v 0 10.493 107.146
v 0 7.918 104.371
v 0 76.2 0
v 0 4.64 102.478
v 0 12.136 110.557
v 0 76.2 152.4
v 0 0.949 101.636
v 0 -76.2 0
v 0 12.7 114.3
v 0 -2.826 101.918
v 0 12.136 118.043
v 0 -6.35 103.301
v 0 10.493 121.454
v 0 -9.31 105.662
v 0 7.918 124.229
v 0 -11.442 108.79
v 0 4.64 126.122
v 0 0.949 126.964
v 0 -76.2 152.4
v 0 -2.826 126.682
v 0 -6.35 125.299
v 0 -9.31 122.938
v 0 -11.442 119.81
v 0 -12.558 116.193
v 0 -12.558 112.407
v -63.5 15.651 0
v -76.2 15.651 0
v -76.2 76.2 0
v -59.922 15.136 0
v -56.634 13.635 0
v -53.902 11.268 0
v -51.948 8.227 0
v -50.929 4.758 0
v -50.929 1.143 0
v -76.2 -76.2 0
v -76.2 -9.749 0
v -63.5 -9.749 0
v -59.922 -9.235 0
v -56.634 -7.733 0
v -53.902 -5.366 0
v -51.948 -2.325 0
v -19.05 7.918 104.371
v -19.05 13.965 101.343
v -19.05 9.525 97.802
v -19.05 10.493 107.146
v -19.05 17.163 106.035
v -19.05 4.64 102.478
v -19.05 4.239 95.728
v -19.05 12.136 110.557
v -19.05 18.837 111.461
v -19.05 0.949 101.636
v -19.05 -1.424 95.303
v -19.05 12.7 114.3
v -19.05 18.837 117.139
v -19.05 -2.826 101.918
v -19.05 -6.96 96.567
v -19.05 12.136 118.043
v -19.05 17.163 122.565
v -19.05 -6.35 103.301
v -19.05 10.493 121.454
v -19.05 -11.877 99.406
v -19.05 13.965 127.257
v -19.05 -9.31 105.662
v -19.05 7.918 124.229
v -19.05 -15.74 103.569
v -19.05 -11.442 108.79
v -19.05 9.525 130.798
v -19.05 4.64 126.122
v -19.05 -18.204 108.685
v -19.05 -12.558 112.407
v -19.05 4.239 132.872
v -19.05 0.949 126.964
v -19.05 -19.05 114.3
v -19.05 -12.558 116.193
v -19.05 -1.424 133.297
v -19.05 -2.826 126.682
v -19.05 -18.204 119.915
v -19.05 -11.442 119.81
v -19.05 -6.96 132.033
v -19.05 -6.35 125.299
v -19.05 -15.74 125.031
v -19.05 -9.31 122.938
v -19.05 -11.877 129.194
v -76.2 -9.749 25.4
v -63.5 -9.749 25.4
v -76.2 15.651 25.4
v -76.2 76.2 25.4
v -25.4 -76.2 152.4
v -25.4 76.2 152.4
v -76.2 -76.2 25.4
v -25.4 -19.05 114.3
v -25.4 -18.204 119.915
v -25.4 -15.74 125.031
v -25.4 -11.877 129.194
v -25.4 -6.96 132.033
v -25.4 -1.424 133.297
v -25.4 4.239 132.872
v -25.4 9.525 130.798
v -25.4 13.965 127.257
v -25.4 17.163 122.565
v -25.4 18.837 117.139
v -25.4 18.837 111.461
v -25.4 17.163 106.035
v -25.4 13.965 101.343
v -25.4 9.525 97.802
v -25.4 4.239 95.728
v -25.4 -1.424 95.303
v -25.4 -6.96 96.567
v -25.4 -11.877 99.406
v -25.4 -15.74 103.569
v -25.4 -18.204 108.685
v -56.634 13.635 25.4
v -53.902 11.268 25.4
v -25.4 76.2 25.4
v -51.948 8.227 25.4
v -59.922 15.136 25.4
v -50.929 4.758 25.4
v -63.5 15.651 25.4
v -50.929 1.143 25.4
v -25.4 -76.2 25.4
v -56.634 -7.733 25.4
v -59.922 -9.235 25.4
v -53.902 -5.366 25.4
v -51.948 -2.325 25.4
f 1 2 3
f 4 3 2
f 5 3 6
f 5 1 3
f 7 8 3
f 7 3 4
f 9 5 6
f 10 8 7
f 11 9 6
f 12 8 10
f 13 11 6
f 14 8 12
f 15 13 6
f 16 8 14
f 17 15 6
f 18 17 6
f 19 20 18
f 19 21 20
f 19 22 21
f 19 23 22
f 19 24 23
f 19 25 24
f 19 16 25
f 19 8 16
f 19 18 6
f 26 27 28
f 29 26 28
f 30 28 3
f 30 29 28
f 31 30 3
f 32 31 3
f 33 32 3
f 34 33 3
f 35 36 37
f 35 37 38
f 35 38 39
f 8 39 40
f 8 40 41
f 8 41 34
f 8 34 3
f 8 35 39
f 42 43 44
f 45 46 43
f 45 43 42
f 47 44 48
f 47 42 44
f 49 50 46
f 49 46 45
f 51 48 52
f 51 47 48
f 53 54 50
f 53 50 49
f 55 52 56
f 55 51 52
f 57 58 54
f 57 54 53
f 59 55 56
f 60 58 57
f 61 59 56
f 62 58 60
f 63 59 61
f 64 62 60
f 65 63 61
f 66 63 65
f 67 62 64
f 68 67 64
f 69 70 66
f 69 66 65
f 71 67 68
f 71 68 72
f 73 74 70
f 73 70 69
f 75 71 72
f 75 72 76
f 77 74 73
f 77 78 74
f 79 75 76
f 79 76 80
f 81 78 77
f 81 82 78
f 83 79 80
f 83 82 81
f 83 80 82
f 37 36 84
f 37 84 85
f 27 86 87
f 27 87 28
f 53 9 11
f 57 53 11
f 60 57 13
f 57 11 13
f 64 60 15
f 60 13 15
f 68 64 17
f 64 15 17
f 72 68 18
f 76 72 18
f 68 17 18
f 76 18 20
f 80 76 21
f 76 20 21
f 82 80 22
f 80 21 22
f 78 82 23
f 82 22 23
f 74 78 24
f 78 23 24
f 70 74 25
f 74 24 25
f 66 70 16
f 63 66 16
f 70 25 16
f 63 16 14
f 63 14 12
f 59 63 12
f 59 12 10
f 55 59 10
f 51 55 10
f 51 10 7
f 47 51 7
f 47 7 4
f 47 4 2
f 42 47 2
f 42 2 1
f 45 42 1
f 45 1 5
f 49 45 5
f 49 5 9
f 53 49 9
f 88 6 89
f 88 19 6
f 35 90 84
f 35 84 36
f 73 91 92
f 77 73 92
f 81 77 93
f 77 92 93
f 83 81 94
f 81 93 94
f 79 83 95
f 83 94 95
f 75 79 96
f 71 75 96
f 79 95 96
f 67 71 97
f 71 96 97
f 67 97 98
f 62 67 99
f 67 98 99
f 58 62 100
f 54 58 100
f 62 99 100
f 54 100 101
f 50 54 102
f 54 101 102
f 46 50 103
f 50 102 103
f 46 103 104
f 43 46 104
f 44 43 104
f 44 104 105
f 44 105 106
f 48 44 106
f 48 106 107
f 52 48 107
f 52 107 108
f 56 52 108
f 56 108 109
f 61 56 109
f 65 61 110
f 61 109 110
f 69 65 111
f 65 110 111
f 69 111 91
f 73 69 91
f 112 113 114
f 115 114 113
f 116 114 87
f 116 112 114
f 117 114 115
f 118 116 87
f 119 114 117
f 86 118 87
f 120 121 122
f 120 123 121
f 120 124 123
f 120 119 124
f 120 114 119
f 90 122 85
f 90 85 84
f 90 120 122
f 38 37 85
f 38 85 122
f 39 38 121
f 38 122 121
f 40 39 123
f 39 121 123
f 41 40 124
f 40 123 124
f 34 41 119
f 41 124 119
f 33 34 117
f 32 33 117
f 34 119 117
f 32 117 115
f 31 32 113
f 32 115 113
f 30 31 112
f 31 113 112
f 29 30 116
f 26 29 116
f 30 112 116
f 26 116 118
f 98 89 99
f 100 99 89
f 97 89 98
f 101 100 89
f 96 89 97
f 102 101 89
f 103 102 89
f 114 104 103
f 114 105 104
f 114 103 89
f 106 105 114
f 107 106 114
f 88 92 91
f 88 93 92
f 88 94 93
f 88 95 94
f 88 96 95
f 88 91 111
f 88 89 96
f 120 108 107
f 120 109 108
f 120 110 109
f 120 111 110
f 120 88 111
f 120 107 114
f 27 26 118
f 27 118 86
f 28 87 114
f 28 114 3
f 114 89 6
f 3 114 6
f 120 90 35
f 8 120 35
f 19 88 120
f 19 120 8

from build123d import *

# Parameters (mm, degrees)
F1_DEPTH = 76.2
F2_R     = 12.7
F3_DEPTH = 76.201
F5_DEPTH = 50.8
F6_R     = 19.05
F6_R_2   = 12.7
F7_DEPTH = 6.35


with BuildPart() as f1:
    # F0 (on Front) → F1 (new body, symmetric)
    with BuildSketch(Plane.XZ):
        Polygon((-25.4, 152.4), (-25.4, 25.4), (-76.2, 25.4), (-76.2, 0), (0, 0), (0, 152.4), align=None)
    extrude(amount=F1_DEPTH, both=True)

    # F2 (on face) → F3 (cut, through all)
    with BuildSketch(Plane.YZ):
        with Locations((0, 114.3)):
            Circle(F2_R)
    extrude(amount=-F3_DEPTH, mode=Mode.SUBTRACT)

    # F4 (on face) → F5 (cut)
    with BuildSketch(Plane.XY.offset(25.4)):
        with BuildLine():
            Line((-76.2, 15.650802), (-76.2, 2.950802))
            Line((-76.2, 2.950802), (-76.2, -9.749198))
            Line((-76.2, -9.749198), (-63.5, -9.749198))
            ThreePointArc((-63.5, -9.749198), (-50.8, 2.950802), (-63.5, 15.650802))
            Line((-63.5, 15.650802), (-76.2, 15.650802))
        make_face()
    extrude(amount=-F5_DEPTH, mode=Mode.SUBTRACT)

    # F6 (on face) → F7 (cut)
    with BuildSketch(Plane(origin=(-25.4, 0, 0), x_dir=(0, -1, 0), z_dir=(-1, 0, 0))):
        with Locations((0, 114.3)):
            Circle(F6_R)
        with Locations((0, 114.3)):
            Circle(F6_R_2, mode=Mode.SUBTRACT)
    extrude(amount=-F7_DEPTH, mode=Mode.SUBTRACT)


solid = f1.part
